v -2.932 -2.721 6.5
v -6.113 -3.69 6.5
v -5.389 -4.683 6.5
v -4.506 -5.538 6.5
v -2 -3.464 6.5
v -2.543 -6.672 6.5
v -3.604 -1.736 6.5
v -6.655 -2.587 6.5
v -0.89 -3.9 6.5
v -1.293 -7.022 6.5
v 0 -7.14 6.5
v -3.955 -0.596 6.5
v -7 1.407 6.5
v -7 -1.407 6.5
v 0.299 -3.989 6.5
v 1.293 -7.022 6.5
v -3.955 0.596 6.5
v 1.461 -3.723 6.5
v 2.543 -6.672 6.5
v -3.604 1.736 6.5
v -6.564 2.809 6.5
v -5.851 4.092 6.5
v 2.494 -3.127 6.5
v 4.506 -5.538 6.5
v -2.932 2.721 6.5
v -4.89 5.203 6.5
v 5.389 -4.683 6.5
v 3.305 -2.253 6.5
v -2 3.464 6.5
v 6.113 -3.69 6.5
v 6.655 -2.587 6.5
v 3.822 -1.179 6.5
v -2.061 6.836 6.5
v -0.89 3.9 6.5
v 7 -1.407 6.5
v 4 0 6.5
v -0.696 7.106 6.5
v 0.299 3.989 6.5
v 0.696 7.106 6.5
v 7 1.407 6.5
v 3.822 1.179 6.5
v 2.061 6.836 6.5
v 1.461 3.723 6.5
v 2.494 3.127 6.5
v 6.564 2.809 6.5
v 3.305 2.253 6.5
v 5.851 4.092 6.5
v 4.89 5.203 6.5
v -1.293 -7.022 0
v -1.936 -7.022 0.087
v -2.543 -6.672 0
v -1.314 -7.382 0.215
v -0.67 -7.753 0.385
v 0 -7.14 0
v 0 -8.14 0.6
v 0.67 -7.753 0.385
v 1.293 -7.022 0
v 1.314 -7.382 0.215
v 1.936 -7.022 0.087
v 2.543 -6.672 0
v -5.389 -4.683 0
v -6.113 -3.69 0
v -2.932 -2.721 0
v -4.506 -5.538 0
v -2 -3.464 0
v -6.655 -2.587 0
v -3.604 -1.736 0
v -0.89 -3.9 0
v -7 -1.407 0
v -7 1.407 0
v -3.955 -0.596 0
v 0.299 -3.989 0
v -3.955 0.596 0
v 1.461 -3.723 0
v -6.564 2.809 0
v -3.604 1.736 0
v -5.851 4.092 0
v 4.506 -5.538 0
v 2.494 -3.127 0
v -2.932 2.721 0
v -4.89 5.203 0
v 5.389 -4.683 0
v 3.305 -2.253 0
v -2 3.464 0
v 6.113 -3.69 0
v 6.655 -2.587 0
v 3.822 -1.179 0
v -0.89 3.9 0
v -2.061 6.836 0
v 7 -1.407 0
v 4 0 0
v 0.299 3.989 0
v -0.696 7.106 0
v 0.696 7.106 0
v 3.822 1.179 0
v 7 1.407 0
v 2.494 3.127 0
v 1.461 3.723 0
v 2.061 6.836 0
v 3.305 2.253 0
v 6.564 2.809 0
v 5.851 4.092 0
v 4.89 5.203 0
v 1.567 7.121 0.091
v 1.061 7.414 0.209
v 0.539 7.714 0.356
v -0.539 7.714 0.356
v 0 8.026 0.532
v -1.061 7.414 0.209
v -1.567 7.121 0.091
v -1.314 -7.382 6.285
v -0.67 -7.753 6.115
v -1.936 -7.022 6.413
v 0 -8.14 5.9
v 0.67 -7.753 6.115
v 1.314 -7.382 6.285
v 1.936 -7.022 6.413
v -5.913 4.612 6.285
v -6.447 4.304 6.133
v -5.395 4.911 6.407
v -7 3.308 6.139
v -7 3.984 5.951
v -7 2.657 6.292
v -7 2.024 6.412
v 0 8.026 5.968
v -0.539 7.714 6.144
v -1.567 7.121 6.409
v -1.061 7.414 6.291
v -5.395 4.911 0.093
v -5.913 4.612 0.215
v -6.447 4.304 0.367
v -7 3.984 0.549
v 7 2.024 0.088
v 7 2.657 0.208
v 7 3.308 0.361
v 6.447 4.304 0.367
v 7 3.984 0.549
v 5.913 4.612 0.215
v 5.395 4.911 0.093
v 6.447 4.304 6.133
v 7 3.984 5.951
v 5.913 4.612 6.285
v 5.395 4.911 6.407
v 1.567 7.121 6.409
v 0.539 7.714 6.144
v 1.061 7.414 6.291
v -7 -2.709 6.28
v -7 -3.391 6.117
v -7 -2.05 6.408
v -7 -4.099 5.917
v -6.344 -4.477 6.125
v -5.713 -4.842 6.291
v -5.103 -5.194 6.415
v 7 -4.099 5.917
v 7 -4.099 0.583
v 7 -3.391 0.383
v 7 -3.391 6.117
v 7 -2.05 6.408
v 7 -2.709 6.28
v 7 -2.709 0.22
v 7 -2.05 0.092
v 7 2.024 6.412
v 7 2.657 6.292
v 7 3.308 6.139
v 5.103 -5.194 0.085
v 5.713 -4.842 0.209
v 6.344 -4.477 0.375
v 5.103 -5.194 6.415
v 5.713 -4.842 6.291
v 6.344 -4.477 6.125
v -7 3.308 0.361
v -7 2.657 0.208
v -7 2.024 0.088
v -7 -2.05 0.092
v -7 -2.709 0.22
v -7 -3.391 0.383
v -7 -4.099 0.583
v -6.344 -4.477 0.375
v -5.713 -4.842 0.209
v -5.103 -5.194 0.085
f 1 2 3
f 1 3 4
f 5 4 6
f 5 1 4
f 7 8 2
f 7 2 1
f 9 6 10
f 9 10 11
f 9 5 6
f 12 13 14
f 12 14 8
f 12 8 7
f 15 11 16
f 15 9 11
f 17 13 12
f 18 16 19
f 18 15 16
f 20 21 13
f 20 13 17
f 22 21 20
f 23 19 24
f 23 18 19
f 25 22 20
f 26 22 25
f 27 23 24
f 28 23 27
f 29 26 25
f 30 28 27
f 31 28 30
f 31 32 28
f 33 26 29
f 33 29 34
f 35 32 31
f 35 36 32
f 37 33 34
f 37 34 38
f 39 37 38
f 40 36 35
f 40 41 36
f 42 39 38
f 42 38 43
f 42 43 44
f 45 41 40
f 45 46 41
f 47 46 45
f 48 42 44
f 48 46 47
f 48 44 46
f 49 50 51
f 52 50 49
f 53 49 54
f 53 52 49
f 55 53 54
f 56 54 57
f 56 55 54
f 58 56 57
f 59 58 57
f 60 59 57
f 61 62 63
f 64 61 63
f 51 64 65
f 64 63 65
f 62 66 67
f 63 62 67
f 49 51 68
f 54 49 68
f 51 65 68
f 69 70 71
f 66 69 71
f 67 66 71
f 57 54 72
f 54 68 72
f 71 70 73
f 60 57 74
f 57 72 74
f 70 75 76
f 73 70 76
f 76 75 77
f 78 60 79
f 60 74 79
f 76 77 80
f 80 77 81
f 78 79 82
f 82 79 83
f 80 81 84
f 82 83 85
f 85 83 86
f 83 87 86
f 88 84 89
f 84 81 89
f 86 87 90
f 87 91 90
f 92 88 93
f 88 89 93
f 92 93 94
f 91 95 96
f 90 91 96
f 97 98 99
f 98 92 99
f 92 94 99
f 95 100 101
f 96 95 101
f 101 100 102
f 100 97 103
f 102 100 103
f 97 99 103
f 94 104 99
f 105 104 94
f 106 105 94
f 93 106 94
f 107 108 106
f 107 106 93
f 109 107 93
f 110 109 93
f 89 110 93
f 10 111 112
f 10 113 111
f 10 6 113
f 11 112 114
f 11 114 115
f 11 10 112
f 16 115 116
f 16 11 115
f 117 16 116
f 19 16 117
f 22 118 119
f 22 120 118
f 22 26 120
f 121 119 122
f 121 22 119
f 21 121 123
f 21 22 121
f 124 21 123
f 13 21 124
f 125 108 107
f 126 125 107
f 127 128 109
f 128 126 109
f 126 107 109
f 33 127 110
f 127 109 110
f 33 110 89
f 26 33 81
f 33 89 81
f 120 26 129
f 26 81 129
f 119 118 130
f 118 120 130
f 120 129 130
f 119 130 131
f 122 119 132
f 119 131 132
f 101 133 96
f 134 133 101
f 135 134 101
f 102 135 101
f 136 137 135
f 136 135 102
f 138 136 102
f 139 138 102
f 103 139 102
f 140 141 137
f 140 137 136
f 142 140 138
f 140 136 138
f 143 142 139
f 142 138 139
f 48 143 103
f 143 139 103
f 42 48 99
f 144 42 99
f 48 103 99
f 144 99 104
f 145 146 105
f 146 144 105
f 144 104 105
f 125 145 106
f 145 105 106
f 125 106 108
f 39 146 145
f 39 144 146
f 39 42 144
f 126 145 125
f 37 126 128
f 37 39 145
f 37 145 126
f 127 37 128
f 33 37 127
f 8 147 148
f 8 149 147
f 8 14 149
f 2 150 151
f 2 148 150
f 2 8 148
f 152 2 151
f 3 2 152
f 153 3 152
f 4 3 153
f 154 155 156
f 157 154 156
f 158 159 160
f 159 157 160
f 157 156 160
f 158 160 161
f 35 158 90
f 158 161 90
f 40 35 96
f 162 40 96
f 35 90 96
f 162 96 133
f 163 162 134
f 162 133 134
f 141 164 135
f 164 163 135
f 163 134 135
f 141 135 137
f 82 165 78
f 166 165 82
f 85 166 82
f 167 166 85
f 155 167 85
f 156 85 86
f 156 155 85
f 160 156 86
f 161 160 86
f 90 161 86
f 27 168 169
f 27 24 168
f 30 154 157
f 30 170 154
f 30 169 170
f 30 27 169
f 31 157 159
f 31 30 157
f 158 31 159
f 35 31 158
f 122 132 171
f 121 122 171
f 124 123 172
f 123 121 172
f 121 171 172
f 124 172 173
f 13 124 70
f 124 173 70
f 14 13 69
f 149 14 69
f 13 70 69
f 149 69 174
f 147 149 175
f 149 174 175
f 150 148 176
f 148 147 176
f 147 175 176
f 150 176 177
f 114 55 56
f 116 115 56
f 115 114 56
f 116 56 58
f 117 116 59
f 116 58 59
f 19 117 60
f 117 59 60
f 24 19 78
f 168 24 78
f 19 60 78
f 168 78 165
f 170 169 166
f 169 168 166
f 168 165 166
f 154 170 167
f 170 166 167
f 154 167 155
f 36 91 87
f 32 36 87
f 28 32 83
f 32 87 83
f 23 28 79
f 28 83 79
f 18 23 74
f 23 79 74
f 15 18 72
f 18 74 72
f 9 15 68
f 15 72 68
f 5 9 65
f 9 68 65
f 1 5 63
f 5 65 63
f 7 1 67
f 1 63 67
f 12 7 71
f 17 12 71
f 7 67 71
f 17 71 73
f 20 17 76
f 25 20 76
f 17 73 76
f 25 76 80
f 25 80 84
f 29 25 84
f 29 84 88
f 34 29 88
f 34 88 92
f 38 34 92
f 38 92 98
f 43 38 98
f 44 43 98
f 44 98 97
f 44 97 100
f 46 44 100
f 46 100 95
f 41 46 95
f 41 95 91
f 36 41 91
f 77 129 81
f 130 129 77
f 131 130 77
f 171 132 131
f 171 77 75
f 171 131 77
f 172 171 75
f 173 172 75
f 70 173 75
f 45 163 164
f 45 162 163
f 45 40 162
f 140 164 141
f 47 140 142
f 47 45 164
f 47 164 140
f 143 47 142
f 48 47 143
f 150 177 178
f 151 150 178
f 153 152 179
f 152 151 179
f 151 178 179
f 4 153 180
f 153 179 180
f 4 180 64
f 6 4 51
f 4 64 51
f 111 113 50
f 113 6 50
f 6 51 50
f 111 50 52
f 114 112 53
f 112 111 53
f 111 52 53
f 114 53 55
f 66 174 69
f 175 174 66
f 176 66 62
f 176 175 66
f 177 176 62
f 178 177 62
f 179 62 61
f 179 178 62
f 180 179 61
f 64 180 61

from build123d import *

# Parameters (mm, degrees)
F0_R     = 4
F1_DEPTH = 15
F3_DEPTH = 6.5
F7_R     = 4
F8_DEPTH = 21.5


with BuildPart() as f1:
    # F0 (on Top) → F1 (new body)
    with BuildSketch(Plane.XY):
        Circle(F0_R)
    extrude(amount=-F1_DEPTH)

    # F2 (on Top) → F3 (join)
    with BuildSketch(Plane.XY):
        Polygon((7, 3.984384), (0, 8.025836), (-7, 3.984384), (-7, -4.098519), (0, -8.139971), (7, -4.098519), align=None)
    extrude(amount=F3_DEPTH)

    # F6: sweep along a path in F5
    with BuildLine(Plane.XY.offset(6.5)) as f6_path:
        CenterArc((0, 0), 8.139971, 0, 360)
    # F4 (on Right) → F6 (sweep, cut)
    with BuildSketch(Plane.YZ):
        Polygon((-8.139971, 5.9), (-7.139971, 6.5), (-8.139971, 6.5), align=None)
        Polygon((-7.139971, 0), (-8.139971, 0.6), (-8.139971, 0), align=None)
    sweep(path=f6_path.line, mode=Mode.SUBTRACT)

    # F7 (on face) → F8 (cut, through all)
    with BuildSketch(Plane(origin=(0, 0, -15), x_dir=(1, 0, 0), z_dir=(0, 0, -1))):
        Circle(F7_R)
    extrude(amount=-F8_DEPTH, mode=Mode.SUBTRACT)


solid = f1.part
